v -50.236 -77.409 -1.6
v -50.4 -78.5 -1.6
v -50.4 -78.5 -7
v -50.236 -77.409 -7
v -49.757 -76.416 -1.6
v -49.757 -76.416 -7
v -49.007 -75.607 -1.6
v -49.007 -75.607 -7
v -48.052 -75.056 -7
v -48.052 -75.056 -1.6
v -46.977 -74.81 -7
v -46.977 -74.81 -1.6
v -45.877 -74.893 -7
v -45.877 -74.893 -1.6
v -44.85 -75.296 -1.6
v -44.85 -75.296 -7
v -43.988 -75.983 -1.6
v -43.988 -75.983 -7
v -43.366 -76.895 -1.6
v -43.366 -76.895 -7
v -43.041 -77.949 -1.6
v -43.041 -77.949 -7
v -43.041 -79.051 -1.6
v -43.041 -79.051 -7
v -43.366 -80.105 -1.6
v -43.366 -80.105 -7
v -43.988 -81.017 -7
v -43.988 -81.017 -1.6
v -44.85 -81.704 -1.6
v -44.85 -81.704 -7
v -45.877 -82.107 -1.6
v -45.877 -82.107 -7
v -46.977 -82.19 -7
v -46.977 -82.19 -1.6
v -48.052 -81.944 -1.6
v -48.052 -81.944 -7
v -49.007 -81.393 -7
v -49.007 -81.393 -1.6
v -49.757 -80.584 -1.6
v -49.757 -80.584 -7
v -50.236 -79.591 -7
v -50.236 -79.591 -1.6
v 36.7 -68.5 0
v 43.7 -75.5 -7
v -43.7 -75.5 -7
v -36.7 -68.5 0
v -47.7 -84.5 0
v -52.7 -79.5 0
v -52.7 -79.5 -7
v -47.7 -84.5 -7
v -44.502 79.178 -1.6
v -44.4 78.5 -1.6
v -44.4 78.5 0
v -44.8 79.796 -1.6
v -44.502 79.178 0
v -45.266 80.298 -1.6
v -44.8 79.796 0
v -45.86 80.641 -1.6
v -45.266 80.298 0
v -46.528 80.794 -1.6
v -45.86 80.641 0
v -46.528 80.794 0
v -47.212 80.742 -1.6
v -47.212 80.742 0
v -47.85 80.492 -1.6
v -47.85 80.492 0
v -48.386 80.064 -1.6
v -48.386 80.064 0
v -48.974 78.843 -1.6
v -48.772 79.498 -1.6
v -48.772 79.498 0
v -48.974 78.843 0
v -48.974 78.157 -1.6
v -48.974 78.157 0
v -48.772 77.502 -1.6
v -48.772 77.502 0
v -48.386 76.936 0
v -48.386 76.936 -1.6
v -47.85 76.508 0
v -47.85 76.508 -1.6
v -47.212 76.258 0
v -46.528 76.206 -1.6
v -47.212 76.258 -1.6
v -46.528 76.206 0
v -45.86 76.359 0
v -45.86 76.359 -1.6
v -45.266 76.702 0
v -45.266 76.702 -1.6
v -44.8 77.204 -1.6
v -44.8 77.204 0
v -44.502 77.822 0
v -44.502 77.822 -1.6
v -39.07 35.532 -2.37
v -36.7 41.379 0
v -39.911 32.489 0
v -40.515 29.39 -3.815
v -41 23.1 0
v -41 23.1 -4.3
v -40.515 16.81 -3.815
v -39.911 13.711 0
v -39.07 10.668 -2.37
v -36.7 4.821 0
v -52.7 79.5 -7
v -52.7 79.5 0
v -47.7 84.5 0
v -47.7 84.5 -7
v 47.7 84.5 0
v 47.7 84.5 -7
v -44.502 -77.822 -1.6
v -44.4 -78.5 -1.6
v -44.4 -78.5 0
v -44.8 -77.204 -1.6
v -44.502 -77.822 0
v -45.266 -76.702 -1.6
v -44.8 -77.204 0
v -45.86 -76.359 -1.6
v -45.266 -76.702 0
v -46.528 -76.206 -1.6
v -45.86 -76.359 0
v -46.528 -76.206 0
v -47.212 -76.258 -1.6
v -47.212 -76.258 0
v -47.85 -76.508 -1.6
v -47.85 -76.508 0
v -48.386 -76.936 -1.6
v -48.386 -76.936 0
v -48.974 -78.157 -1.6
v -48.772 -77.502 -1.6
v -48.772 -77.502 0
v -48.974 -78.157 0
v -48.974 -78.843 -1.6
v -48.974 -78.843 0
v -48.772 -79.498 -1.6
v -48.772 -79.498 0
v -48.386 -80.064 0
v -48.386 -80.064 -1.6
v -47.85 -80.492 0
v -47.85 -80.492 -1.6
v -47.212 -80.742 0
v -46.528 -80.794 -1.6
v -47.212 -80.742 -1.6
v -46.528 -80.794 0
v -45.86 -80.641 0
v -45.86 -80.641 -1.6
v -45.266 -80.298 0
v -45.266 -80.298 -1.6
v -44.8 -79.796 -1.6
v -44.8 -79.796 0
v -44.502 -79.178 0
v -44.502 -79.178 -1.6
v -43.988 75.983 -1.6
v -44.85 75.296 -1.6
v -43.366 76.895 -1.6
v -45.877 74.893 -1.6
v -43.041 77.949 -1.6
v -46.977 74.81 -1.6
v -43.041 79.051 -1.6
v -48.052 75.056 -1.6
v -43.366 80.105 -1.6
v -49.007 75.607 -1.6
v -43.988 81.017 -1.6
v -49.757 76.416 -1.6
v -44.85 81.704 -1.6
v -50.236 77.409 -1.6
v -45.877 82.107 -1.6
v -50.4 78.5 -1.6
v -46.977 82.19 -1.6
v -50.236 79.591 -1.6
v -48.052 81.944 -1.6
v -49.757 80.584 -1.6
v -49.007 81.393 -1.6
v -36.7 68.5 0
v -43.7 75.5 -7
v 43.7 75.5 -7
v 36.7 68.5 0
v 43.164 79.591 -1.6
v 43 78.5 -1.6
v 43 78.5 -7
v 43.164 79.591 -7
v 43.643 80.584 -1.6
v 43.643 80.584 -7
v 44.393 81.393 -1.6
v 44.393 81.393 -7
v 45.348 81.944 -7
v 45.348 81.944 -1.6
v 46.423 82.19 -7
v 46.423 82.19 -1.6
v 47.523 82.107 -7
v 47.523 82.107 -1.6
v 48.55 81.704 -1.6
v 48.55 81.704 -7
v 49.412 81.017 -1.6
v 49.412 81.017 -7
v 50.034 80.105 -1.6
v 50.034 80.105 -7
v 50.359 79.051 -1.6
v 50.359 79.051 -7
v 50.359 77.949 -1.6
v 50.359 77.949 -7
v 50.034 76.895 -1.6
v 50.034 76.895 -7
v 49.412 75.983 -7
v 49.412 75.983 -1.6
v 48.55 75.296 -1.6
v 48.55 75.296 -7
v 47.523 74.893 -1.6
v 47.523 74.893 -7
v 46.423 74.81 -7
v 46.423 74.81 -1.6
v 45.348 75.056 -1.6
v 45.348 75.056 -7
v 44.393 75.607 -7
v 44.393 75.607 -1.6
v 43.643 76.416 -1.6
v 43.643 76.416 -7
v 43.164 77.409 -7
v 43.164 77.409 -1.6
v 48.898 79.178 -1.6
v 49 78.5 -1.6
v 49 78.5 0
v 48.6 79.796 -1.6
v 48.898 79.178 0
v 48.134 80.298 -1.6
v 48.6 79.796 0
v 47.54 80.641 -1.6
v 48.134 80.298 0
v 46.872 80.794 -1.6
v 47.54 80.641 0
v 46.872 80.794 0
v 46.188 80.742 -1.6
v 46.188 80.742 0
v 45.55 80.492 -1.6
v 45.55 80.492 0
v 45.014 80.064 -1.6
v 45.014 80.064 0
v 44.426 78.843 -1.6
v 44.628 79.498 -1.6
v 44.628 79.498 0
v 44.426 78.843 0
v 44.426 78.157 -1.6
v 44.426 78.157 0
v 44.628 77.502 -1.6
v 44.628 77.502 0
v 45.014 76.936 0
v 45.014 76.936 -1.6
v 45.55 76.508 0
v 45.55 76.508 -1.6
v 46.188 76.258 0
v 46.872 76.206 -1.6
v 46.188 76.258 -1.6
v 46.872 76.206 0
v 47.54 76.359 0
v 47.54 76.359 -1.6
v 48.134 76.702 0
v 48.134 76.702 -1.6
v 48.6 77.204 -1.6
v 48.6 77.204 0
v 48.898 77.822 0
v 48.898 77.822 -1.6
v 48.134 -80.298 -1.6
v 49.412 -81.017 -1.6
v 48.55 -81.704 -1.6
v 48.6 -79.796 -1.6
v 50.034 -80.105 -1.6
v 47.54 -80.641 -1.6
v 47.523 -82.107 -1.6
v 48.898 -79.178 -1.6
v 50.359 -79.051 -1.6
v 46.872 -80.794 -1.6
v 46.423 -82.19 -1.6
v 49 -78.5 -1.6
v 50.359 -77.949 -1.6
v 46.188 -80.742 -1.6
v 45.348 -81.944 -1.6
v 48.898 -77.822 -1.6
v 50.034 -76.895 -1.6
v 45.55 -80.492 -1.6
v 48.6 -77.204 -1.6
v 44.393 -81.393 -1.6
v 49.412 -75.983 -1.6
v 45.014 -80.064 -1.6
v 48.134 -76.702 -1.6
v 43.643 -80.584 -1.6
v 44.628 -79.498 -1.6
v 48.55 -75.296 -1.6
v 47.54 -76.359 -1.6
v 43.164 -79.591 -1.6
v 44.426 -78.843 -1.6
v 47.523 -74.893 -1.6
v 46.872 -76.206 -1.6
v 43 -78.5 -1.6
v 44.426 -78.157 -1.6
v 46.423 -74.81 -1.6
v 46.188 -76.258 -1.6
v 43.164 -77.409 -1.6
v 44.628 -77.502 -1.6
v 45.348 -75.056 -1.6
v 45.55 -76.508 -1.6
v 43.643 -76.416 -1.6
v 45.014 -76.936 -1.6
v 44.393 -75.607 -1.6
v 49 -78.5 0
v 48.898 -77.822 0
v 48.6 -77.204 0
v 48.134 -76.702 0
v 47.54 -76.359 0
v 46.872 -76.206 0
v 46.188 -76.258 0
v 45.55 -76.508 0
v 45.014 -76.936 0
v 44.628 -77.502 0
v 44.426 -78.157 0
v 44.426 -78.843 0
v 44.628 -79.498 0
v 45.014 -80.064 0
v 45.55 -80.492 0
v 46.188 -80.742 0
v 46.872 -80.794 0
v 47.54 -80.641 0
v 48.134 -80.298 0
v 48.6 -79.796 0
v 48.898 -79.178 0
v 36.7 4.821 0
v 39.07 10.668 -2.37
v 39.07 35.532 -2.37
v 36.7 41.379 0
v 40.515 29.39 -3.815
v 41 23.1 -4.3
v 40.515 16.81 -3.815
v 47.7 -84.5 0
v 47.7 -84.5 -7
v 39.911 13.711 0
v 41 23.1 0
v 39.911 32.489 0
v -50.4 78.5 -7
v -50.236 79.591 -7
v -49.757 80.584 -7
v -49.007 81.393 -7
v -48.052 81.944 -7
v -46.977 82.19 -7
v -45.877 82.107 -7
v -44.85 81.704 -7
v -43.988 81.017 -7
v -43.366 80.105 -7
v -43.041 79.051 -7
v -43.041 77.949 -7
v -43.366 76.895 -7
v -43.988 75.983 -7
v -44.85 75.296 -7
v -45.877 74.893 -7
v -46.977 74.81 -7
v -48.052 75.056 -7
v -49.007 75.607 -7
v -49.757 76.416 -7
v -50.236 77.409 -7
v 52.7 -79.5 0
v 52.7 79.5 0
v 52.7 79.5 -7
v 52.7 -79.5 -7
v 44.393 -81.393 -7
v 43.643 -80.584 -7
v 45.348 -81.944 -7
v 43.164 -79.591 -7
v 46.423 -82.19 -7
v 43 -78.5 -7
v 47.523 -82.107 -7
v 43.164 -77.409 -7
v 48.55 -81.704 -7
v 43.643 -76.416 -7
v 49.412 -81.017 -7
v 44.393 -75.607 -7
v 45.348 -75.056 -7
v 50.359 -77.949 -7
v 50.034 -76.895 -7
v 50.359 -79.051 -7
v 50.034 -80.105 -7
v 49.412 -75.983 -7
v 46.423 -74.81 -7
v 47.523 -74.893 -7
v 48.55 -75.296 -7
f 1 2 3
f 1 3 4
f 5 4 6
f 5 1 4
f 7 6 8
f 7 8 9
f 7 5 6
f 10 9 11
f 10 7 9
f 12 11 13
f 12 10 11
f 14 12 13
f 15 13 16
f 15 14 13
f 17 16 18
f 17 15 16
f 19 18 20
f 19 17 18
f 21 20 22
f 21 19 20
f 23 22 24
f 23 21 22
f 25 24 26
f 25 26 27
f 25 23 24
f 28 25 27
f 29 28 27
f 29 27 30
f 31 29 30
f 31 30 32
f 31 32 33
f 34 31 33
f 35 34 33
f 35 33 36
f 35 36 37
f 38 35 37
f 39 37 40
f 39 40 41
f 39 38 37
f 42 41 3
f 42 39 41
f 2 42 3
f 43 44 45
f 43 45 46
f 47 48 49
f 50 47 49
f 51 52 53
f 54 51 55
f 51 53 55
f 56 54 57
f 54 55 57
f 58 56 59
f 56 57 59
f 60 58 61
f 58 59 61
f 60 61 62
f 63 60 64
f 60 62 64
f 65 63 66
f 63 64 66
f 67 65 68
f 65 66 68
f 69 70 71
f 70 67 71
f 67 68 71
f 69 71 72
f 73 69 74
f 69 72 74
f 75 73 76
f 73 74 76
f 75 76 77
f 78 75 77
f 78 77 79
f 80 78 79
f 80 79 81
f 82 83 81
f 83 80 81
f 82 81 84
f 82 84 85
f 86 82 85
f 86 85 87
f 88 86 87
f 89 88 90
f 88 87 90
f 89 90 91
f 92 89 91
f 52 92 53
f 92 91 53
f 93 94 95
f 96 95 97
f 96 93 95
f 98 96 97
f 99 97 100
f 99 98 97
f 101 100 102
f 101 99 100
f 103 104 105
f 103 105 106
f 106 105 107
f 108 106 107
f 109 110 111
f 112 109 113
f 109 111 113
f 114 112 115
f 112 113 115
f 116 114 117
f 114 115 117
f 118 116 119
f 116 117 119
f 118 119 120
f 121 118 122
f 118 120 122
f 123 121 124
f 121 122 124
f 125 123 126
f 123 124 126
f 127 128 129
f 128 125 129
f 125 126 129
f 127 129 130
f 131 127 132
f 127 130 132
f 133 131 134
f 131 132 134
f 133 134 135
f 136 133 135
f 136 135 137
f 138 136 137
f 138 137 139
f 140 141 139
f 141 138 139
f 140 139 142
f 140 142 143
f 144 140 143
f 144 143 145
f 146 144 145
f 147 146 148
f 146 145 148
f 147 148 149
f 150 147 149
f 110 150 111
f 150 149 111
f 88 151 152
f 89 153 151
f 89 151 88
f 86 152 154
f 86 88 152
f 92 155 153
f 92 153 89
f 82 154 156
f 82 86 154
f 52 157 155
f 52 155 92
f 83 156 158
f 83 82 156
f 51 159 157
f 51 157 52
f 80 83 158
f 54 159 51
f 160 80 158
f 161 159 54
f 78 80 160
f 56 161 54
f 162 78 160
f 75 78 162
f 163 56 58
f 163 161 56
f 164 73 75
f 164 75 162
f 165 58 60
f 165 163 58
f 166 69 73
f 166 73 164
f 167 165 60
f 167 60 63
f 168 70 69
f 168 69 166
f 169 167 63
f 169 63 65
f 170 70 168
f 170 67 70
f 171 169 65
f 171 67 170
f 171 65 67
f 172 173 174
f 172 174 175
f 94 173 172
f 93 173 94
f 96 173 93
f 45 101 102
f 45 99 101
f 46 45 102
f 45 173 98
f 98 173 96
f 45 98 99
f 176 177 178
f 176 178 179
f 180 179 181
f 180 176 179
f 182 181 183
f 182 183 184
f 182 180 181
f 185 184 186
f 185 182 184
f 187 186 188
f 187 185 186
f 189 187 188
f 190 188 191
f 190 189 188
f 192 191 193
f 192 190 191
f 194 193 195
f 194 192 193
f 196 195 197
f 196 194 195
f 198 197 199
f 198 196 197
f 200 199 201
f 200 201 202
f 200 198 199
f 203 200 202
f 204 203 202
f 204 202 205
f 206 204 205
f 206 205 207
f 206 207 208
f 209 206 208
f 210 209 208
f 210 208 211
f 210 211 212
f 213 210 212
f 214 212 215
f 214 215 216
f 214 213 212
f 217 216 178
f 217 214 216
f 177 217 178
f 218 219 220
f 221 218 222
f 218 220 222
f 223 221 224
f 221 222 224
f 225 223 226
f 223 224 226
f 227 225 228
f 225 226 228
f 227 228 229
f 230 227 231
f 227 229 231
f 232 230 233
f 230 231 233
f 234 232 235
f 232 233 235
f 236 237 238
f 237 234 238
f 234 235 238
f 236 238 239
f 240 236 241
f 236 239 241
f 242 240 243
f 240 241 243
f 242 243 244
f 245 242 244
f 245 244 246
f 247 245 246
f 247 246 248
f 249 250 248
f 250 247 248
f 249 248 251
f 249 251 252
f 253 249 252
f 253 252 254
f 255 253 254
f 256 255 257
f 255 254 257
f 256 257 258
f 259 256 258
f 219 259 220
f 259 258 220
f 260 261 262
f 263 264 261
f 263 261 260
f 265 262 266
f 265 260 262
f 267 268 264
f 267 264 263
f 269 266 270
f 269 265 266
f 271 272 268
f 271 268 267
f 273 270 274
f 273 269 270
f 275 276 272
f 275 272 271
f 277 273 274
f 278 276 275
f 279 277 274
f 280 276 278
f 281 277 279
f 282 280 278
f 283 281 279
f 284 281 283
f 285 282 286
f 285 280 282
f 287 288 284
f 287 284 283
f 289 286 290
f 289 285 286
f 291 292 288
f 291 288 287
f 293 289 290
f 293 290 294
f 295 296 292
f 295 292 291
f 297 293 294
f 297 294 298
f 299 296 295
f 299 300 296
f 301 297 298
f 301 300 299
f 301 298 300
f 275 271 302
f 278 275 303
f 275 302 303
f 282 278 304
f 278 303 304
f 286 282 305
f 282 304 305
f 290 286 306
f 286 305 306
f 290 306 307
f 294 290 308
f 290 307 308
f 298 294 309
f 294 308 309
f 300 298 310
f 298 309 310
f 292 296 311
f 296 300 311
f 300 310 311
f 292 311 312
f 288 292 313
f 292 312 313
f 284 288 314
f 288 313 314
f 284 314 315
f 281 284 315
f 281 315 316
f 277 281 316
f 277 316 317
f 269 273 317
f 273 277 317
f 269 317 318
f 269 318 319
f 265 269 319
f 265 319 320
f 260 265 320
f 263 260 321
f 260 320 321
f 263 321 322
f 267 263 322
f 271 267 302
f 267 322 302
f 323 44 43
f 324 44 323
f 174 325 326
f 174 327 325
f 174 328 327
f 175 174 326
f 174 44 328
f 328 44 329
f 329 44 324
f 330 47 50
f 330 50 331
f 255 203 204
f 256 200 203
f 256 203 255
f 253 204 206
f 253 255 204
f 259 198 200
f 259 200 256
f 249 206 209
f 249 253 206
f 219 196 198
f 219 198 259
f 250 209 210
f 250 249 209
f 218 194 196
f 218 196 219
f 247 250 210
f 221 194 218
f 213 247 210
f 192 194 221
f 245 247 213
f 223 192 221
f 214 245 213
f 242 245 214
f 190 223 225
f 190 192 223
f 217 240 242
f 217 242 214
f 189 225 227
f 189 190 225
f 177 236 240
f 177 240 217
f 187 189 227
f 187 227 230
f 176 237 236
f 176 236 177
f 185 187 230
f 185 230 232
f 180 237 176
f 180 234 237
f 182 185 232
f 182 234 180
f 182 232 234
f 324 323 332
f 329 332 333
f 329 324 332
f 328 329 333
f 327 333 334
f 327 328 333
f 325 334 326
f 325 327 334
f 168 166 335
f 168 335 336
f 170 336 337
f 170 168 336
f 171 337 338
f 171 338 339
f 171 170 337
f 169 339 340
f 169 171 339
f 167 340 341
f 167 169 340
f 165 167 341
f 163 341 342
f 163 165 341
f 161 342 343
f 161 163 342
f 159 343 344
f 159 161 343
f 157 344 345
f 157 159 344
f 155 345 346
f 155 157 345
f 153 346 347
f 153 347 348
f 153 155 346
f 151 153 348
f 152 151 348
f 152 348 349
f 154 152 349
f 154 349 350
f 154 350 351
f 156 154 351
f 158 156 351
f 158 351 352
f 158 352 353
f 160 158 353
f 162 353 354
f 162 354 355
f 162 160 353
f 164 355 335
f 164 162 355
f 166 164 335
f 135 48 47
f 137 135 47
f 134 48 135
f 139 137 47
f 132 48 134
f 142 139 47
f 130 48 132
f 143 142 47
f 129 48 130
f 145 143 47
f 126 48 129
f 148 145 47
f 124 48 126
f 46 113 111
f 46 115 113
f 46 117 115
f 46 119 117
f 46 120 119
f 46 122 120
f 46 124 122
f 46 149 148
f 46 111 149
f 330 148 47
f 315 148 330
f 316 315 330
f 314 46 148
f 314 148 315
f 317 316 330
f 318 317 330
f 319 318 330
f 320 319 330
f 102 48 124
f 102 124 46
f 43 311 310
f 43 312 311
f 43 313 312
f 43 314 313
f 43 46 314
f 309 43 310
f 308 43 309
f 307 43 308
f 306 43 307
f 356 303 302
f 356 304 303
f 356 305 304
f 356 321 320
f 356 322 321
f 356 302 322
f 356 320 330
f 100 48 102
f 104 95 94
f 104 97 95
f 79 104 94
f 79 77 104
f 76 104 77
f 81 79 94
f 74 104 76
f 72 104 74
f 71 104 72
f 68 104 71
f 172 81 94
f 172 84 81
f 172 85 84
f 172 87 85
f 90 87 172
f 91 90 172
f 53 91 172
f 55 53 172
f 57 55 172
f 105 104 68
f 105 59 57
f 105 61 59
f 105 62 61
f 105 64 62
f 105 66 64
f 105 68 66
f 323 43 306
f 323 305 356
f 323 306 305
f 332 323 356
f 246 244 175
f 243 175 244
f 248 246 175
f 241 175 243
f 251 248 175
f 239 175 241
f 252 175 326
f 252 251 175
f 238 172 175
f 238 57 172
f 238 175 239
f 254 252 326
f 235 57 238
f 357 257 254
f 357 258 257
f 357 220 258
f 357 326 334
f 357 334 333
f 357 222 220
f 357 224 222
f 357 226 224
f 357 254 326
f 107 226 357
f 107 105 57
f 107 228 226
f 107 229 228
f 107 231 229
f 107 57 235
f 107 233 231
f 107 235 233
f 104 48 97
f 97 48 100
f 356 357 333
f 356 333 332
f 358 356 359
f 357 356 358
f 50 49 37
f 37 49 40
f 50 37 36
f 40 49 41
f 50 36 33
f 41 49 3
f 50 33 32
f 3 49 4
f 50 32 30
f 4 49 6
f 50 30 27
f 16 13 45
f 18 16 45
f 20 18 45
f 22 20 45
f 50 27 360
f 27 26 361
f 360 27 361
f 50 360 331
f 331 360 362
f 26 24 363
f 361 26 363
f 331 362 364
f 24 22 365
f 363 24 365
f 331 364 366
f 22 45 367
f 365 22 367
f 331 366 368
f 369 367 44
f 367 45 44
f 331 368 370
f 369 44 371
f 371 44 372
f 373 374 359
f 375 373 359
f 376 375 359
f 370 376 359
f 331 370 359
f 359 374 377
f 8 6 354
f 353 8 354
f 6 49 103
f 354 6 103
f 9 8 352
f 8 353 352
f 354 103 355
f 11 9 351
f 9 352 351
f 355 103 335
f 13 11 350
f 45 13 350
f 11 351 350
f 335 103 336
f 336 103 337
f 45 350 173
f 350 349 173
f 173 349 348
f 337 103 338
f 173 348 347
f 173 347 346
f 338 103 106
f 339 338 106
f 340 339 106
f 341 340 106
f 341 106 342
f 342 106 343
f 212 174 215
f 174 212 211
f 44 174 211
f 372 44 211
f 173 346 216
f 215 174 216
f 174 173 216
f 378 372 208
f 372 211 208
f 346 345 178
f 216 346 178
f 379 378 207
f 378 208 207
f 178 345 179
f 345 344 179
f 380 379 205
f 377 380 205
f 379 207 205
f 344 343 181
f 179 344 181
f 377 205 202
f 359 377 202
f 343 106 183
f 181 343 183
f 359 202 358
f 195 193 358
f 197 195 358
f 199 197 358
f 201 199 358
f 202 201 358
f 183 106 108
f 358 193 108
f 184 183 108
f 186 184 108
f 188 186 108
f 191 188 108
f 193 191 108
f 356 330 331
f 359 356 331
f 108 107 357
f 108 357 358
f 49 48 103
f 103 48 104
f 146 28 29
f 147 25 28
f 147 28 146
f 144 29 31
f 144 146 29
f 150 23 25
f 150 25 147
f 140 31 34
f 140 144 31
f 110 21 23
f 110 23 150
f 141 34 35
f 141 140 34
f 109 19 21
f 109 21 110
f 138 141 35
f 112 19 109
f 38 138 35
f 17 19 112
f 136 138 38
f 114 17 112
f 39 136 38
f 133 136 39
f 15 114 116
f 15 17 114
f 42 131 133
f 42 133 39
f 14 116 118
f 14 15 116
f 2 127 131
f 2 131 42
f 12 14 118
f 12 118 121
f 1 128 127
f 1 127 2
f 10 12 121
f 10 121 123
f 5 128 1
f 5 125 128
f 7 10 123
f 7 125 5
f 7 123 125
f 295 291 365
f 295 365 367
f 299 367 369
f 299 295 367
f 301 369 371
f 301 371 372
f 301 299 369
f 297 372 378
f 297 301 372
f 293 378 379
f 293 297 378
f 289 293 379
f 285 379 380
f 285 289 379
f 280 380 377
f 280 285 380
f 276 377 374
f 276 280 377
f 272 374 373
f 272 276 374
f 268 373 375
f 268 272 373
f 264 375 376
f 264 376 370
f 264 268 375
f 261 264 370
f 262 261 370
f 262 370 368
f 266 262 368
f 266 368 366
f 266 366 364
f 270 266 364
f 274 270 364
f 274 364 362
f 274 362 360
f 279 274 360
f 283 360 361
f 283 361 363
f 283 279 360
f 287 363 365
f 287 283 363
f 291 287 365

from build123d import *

# Parameters (mm, degrees)
ESQUISSE1_W             = 105.4
ESQUISSE1_H             = 169
ESQUISSE1_W_2           = 69.4
ESQUISSE1_H_2           = 133
BOSS_EXTRU_1_DEPTH      = 7
CHANFREIN4_SIZE         = 5
CHANFREIN3_SIZE         = 9
ENL_V_MAT_EXTRU_1_REACH = 101.833
ESQUISSE2_R             = 2.3
ENL_V_START             = -5.4
ESQUISSE5_R             = 3.7
ESQUISSE5_R_2           = 2.3
ENL_V_MAT_EXTRU_4_DEPTH = 5.4
ENL_V_START_2           = -4.3
ESQUISSE4_R             = 41
ENL_V_MAT_EXTRU_3_DEPTH = 4.3


with BuildPart() as part:
    # Esquisse1 → Boss.-Extru.1 (new body)
    with BuildSketch(Plane.XY):
        Rectangle(ESQUISSE1_W, ESQUISSE1_H)
        Rectangle(ESQUISSE1_W_2, ESQUISSE1_H_2, mode=Mode.SUBTRACT)
    extrude(amount=-BOSS_EXTRU_1_DEPTH)

    # Chanfrein4
    chanfrein4_edges = [part.edges().sort_by_distance(p)[0] for p in [
        (-52.7, 84.5, -3.5),
        (52.7, 84.5, -3.5),
        (52.7, -84.5, -3.5),
        (-52.7, -84.5, -3.5),
    ]]
    chamfer(chanfrein4_edges, length=CHANFREIN4_SIZE)

    # Chanfrein3
    # the kernel refuses this chamfer: 9 mm, written as the material it takes off along each edge
    with BuildSketch(Plane(origin=(-34.7, -66.5, -7), x_dir=(-0.9996219169112966, 0, -0.0274958766105864), z_dir=(0, 1, 0)), Plane(origin=(34.7, 66.5, -7), x_dir=(0.9996219169112966, 0, -0.0274958766105864), z_dir=(0, -1, 0))) as chanfrein3_piece_1:
        Polygon((CHANFREIN3_SIZE * 0.999621916911, CHANFREIN3_SIZE * 0.0274958766106), (-CHANFREIN3_SIZE * 0.0274958766106, CHANFREIN3_SIZE * 0.999621916911), (0, 0), align=None)
    extrude(amount=133, mode=Mode.SUBTRACT)
    with BuildSketch(Plane(origin=(-34.7, 66.5, -7), x_dir=(0, 0.9996219169112966, -0.02749587661058638), z_dir=(1, 0, 0)), Plane(origin=(34.7, -66.5, -7), x_dir=(0, -0.9996219169112966, -0.02749587661058638), z_dir=(-1, 0, 0))) as chanfrein3_piece_2:
        Polygon((CHANFREIN3_SIZE * 0.999621916911, CHANFREIN3_SIZE * 0.0274958766106), (-CHANFREIN3_SIZE * 0.0274958766106, CHANFREIN3_SIZE * 0.999621916911), (0, 0), align=None)
    extrude(amount=69.4, mode=Mode.SUBTRACT)
    with BuildSketch(Plane(origin=(-34.7, -89.645146892, -7), x_dir=(-0.9996219169112966, 0, -0.0274958766105864), z_dir=(0, 1, 0))) as chanfrein3_piece_3a_section:
        Polygon((CHANFREIN3_SIZE * 0.999621916911, CHANFREIN3_SIZE * 0.0274958766106), (-CHANFREIN3_SIZE * 0.0274958766106, CHANFREIN3_SIZE * 0.999621916911), (0, 0), align=None)
    chanfrein3_piece_3a = extrude(amount=156.145146892, mode=Mode.PRIVATE)
    chanfrein3_piece_3a = split(chanfrein3_piece_3a, bisect_by=Plane(origin=(-37.668142641, -66.5, -4.031857359), z_dir=(0, -1, 0)), keep=Keep.TOP, mode=Mode.PRIVATE)
    with BuildSketch(Plane(origin=(34.7, -66.5, -7), x_dir=(0, -0.9996219169112966, -0.02749587661058638), z_dir=(-1, 0, 0))) as chanfrein3_piece_3b_section:
        Polygon((CHANFREIN3_SIZE * 0.999621916911, CHANFREIN3_SIZE * 0.0274958766106), (-CHANFREIN3_SIZE * 0.0274958766106, CHANFREIN3_SIZE * 0.999621916911), (0, 0), align=None)
    chanfrein3_piece_3b = extrude(amount=92.545146892, mode=Mode.PRIVATE)
    chanfrein3_piece_3b = split(chanfrein3_piece_3b, bisect_by=Plane(origin=(-34.7, -69.468142641, -4.031857359), z_dir=(-1, 0, 0)), keep=Keep.TOP, mode=Mode.PRIVATE)
    chanfrein3_piece_3 = chanfrein3_piece_3a & chanfrein3_piece_3b
    add(chanfrein3_piece_3, mode=Mode.SUBTRACT)
    with BuildSketch(Plane(origin=(-34.7, -66.5, -7), x_dir=(-0.9996219169112966, 0, -0.0274958766105864), z_dir=(0, 1, 0))) as chanfrein3_piece_4a_section:
        Polygon((CHANFREIN3_SIZE * 0.999621916911, CHANFREIN3_SIZE * 0.0274958766106), (-CHANFREIN3_SIZE * 0.0274958766106, CHANFREIN3_SIZE * 0.999621916911), (0, 0), align=None)
    chanfrein3_piece_4a = extrude(amount=156.145146892, mode=Mode.PRIVATE)
    chanfrein3_piece_4a = split(chanfrein3_piece_4a, bisect_by=Plane(origin=(-37.668142641, 66.5, -4.031857359), z_dir=(0, 1, 0)), keep=Keep.TOP, mode=Mode.PRIVATE)
    with BuildSketch(Plane(origin=(-57.845146892, 66.5, -7), x_dir=(0, 0.9996219169112966, -0.02749587661058638), z_dir=(1, 0, 0))) as chanfrein3_piece_4b_section:
        Polygon((CHANFREIN3_SIZE * 0.999621916911, CHANFREIN3_SIZE * 0.0274958766106), (-CHANFREIN3_SIZE * 0.0274958766106, CHANFREIN3_SIZE * 0.999621916911), (0, 0), align=None)
    chanfrein3_piece_4b = extrude(amount=92.545146892, mode=Mode.PRIVATE)
    chanfrein3_piece_4b = split(chanfrein3_piece_4b, bisect_by=Plane(origin=(-34.7, 69.468142641, -4.031857359), z_dir=(-1, 0, 0)), keep=Keep.TOP, mode=Mode.PRIVATE)
    chanfrein3_piece_4 = chanfrein3_piece_4a & chanfrein3_piece_4b
    add(chanfrein3_piece_4, mode=Mode.SUBTRACT)
    with BuildSketch(Plane(origin=(34.7, 89.645146892, -7), x_dir=(0.9996219169112966, 0, -0.0274958766105864), z_dir=(0, -1, 0))) as chanfrein3_piece_5a_section:
        Polygon((CHANFREIN3_SIZE * 0.999621916911, CHANFREIN3_SIZE * 0.0274958766106), (-CHANFREIN3_SIZE * 0.0274958766106, CHANFREIN3_SIZE * 0.999621916911), (0, 0), align=None)
    chanfrein3_piece_5a = extrude(amount=156.145146892, mode=Mode.PRIVATE)
    chanfrein3_piece_5a = split(chanfrein3_piece_5a, bisect_by=Plane(origin=(37.668142641, 66.5, -4.031857359), z_dir=(0, 1, 0)), keep=Keep.TOP, mode=Mode.PRIVATE)
    with BuildSketch(Plane(origin=(-34.7, 66.5, -7), x_dir=(0, 0.9996219169112966, -0.02749587661058638), z_dir=(1, 0, 0))) as chanfrein3_piece_5b_section:
        Polygon((CHANFREIN3_SIZE * 0.999621916911, CHANFREIN3_SIZE * 0.0274958766106), (-CHANFREIN3_SIZE * 0.0274958766106, CHANFREIN3_SIZE * 0.999621916911), (0, 0), align=None)
    chanfrein3_piece_5b = extrude(amount=92.545146892, mode=Mode.PRIVATE)
    chanfrein3_piece_5b = split(chanfrein3_piece_5b, bisect_by=Plane(origin=(34.7, 69.468142641, -4.031857359), z_dir=(1, 0, 0)), keep=Keep.TOP, mode=Mode.PRIVATE)
    chanfrein3_piece_5 = chanfrein3_piece_5a & chanfrein3_piece_5b
    add(chanfrein3_piece_5, mode=Mode.SUBTRACT)
    with BuildSketch(Plane(origin=(57.845146892, -66.5, -7), x_dir=(0, -0.9996219169112966, -0.02749587661058638), z_dir=(-1, 0, 0))) as chanfrein3_piece_6a_section:
        Polygon((CHANFREIN3_SIZE * 0.999621916911, CHANFREIN3_SIZE * 0.0274958766106), (-CHANFREIN3_SIZE * 0.0274958766106, CHANFREIN3_SIZE * 0.999621916911), (0, 0), align=None)
    chanfrein3_piece_6a = extrude(amount=92.545146892, mode=Mode.PRIVATE)
    chanfrein3_piece_6a = split(chanfrein3_piece_6a, bisect_by=Plane(origin=(34.7, -69.468142641, -4.031857359), z_dir=(1, 0, 0)), keep=Keep.TOP, mode=Mode.PRIVATE)
    with BuildSketch(Plane(origin=(34.7, 66.5, -7), x_dir=(0.9996219169112966, 0, -0.0274958766105864), z_dir=(0, -1, 0))) as chanfrein3_piece_6b_section:
        Polygon((CHANFREIN3_SIZE * 0.999621916911, CHANFREIN3_SIZE * 0.0274958766106), (-CHANFREIN3_SIZE * 0.0274958766106, CHANFREIN3_SIZE * 0.999621916911), (0, 0), align=None)
    chanfrein3_piece_6b = extrude(amount=156.145146892, mode=Mode.PRIVATE)
    chanfrein3_piece_6b = split(chanfrein3_piece_6b, bisect_by=Plane(origin=(37.668142641, -66.5, -4.031857359), z_dir=(0, -1, 0)), keep=Keep.TOP, mode=Mode.PRIVATE)
    chanfrein3_piece_6 = chanfrein3_piece_6a & chanfrein3_piece_6b
    add(chanfrein3_piece_6, mode=Mode.SUBTRACT)

    # Esquisse2 → Enlèv. mat.-Extru.1 (cut, up to next)
    with BuildSketch(Plane.XY, mode=Mode.PRIVATE) as enl_v_mat_extru_1_sk1:
        with Locations((-46.7, 78.5)):
            Circle(ESQUISSE2_R)
    enl_v_mat_extru_1_tool1 = extrude(enl_v_mat_extru_1_sk1.sketch, amount=-ENL_V_MAT_EXTRU_1_REACH, mode=Mode.PRIVATE) & part.part
    # Esquisse2 → Enlèv. mat.-Extru.1 (cut, up to next)
    with BuildSketch(Plane.XY, mode=Mode.PRIVATE) as enl_v_mat_extru_1_sk2:
        with Locations((46.7, 78.5)):
            Circle(ESQUISSE2_R)
    enl_v_mat_extru_1_tool2 = extrude(enl_v_mat_extru_1_sk2.sketch, amount=-ENL_V_MAT_EXTRU_1_REACH, mode=Mode.PRIVATE) & part.part
    # Esquisse2 → Enlèv. mat.-Extru.1 (cut, up to next)
    with BuildSketch(Plane.XY, mode=Mode.PRIVATE) as enl_v_mat_extru_1_sk3:
        with Locations((-46.7, -78.5)):
            Circle(ESQUISSE2_R)
    enl_v_mat_extru_1_tool3 = extrude(enl_v_mat_extru_1_sk3.sketch, amount=-ENL_V_MAT_EXTRU_1_REACH, mode=Mode.PRIVATE) & part.part
    # Esquisse2 → Enlèv. mat.-Extru.1 (cut, up to next)
    with BuildSketch(Plane.XY, mode=Mode.PRIVATE) as enl_v_mat_extru_1_sk4:
        with Locations((46.7, -78.5)):
            Circle(ESQUISSE2_R)
    enl_v_mat_extru_1_tool4 = extrude(enl_v_mat_extru_1_sk4.sketch, amount=-ENL_V_MAT_EXTRU_1_REACH, mode=Mode.PRIVATE) & part.part
    add(enl_v_mat_extru_1_tool1.solids().sort_by_distance((-46.7, 78.5, 0))[0], mode=Mode.SUBTRACT)
    add(enl_v_mat_extru_1_tool2.solids().sort_by_distance((46.7, 78.5, 0))[0], mode=Mode.SUBTRACT)
    add(enl_v_mat_extru_1_tool3.solids().sort_by_distance((-46.7, -78.5, 0))[0], mode=Mode.SUBTRACT)
    add(enl_v_mat_extru_1_tool4.solids().sort_by_distance((46.7, -78.5, 0))[0], mode=Mode.SUBTRACT)

    # Esquisse5 → Enlèv. mat.-Extru.4 (cut)
    # profile 1 of 4: a face of its own
    with BuildSketch(Plane(origin=(0, 0, -7), x_dir=(-1, 0, 0), z_dir=(0, 0, -1)).offset(ENL_V_START)):
        with Locations((-46.7, 78.5)):
            Circle(ESQUISSE5_R)
        with Locations(Location((-46.7, 78.5, 0), (0, 0, 180))):
            Circle(ESQUISSE5_R_2, mode=Mode.SUBTRACT)
    # profile 2 of 4: a face of its own
    with BuildSketch(Plane(origin=(0, 0, -7), x_dir=(-1, 0, 0), z_dir=(0, 0, -1)).offset(ENL_V_START)):
        with Locations((46.7, 78.5)):
            Circle(ESQUISSE5_R)
        with Locations(Location((46.7, 78.5, 0), (0, 0, 180))):
            Circle(ESQUISSE5_R_2, mode=Mode.SUBTRACT)
    # profile 3 of 4: a face of its own
    with BuildSketch(Plane(origin=(0, 0, -7), x_dir=(-1, 0, 0), z_dir=(0, 0, -1)).offset(ENL_V_START)):
        with Locations((46.7, -78.5)):
            Circle(ESQUISSE5_R)
        with Locations(Location((46.7, -78.5, 0), (0, 0, 180))):
            Circle(ESQUISSE5_R_2, mode=Mode.SUBTRACT)
    # profile 4 of 4: a face of its own
    with BuildSketch(Plane(origin=(0, 0, -7), x_dir=(-1, 0, 0), z_dir=(0, 0, -1)).offset(ENL_V_START)):
        with Locations((-46.7, -78.5)):
            Circle(ESQUISSE5_R)
        with Locations(Location((-46.7, -78.5, 0), (0, 0, 180))):
            Circle(ESQUISSE5_R_2, mode=Mode.SUBTRACT)
    extrude(amount=ENL_V_MAT_EXTRU_4_DEPTH, mode=Mode.SUBTRACT)

    # Esquisse4 → Enlèv. mat.-Extru.3 (cut)
    with BuildSketch(Plane.XY.offset(ENL_V_START_2)):
        with Locations((0, 23.1)):
            Circle(ESQUISSE4_R)
    extrude(amount=ENL_V_MAT_EXTRU_3_DEPTH, mode=Mode.SUBTRACT)


solid = part.part
